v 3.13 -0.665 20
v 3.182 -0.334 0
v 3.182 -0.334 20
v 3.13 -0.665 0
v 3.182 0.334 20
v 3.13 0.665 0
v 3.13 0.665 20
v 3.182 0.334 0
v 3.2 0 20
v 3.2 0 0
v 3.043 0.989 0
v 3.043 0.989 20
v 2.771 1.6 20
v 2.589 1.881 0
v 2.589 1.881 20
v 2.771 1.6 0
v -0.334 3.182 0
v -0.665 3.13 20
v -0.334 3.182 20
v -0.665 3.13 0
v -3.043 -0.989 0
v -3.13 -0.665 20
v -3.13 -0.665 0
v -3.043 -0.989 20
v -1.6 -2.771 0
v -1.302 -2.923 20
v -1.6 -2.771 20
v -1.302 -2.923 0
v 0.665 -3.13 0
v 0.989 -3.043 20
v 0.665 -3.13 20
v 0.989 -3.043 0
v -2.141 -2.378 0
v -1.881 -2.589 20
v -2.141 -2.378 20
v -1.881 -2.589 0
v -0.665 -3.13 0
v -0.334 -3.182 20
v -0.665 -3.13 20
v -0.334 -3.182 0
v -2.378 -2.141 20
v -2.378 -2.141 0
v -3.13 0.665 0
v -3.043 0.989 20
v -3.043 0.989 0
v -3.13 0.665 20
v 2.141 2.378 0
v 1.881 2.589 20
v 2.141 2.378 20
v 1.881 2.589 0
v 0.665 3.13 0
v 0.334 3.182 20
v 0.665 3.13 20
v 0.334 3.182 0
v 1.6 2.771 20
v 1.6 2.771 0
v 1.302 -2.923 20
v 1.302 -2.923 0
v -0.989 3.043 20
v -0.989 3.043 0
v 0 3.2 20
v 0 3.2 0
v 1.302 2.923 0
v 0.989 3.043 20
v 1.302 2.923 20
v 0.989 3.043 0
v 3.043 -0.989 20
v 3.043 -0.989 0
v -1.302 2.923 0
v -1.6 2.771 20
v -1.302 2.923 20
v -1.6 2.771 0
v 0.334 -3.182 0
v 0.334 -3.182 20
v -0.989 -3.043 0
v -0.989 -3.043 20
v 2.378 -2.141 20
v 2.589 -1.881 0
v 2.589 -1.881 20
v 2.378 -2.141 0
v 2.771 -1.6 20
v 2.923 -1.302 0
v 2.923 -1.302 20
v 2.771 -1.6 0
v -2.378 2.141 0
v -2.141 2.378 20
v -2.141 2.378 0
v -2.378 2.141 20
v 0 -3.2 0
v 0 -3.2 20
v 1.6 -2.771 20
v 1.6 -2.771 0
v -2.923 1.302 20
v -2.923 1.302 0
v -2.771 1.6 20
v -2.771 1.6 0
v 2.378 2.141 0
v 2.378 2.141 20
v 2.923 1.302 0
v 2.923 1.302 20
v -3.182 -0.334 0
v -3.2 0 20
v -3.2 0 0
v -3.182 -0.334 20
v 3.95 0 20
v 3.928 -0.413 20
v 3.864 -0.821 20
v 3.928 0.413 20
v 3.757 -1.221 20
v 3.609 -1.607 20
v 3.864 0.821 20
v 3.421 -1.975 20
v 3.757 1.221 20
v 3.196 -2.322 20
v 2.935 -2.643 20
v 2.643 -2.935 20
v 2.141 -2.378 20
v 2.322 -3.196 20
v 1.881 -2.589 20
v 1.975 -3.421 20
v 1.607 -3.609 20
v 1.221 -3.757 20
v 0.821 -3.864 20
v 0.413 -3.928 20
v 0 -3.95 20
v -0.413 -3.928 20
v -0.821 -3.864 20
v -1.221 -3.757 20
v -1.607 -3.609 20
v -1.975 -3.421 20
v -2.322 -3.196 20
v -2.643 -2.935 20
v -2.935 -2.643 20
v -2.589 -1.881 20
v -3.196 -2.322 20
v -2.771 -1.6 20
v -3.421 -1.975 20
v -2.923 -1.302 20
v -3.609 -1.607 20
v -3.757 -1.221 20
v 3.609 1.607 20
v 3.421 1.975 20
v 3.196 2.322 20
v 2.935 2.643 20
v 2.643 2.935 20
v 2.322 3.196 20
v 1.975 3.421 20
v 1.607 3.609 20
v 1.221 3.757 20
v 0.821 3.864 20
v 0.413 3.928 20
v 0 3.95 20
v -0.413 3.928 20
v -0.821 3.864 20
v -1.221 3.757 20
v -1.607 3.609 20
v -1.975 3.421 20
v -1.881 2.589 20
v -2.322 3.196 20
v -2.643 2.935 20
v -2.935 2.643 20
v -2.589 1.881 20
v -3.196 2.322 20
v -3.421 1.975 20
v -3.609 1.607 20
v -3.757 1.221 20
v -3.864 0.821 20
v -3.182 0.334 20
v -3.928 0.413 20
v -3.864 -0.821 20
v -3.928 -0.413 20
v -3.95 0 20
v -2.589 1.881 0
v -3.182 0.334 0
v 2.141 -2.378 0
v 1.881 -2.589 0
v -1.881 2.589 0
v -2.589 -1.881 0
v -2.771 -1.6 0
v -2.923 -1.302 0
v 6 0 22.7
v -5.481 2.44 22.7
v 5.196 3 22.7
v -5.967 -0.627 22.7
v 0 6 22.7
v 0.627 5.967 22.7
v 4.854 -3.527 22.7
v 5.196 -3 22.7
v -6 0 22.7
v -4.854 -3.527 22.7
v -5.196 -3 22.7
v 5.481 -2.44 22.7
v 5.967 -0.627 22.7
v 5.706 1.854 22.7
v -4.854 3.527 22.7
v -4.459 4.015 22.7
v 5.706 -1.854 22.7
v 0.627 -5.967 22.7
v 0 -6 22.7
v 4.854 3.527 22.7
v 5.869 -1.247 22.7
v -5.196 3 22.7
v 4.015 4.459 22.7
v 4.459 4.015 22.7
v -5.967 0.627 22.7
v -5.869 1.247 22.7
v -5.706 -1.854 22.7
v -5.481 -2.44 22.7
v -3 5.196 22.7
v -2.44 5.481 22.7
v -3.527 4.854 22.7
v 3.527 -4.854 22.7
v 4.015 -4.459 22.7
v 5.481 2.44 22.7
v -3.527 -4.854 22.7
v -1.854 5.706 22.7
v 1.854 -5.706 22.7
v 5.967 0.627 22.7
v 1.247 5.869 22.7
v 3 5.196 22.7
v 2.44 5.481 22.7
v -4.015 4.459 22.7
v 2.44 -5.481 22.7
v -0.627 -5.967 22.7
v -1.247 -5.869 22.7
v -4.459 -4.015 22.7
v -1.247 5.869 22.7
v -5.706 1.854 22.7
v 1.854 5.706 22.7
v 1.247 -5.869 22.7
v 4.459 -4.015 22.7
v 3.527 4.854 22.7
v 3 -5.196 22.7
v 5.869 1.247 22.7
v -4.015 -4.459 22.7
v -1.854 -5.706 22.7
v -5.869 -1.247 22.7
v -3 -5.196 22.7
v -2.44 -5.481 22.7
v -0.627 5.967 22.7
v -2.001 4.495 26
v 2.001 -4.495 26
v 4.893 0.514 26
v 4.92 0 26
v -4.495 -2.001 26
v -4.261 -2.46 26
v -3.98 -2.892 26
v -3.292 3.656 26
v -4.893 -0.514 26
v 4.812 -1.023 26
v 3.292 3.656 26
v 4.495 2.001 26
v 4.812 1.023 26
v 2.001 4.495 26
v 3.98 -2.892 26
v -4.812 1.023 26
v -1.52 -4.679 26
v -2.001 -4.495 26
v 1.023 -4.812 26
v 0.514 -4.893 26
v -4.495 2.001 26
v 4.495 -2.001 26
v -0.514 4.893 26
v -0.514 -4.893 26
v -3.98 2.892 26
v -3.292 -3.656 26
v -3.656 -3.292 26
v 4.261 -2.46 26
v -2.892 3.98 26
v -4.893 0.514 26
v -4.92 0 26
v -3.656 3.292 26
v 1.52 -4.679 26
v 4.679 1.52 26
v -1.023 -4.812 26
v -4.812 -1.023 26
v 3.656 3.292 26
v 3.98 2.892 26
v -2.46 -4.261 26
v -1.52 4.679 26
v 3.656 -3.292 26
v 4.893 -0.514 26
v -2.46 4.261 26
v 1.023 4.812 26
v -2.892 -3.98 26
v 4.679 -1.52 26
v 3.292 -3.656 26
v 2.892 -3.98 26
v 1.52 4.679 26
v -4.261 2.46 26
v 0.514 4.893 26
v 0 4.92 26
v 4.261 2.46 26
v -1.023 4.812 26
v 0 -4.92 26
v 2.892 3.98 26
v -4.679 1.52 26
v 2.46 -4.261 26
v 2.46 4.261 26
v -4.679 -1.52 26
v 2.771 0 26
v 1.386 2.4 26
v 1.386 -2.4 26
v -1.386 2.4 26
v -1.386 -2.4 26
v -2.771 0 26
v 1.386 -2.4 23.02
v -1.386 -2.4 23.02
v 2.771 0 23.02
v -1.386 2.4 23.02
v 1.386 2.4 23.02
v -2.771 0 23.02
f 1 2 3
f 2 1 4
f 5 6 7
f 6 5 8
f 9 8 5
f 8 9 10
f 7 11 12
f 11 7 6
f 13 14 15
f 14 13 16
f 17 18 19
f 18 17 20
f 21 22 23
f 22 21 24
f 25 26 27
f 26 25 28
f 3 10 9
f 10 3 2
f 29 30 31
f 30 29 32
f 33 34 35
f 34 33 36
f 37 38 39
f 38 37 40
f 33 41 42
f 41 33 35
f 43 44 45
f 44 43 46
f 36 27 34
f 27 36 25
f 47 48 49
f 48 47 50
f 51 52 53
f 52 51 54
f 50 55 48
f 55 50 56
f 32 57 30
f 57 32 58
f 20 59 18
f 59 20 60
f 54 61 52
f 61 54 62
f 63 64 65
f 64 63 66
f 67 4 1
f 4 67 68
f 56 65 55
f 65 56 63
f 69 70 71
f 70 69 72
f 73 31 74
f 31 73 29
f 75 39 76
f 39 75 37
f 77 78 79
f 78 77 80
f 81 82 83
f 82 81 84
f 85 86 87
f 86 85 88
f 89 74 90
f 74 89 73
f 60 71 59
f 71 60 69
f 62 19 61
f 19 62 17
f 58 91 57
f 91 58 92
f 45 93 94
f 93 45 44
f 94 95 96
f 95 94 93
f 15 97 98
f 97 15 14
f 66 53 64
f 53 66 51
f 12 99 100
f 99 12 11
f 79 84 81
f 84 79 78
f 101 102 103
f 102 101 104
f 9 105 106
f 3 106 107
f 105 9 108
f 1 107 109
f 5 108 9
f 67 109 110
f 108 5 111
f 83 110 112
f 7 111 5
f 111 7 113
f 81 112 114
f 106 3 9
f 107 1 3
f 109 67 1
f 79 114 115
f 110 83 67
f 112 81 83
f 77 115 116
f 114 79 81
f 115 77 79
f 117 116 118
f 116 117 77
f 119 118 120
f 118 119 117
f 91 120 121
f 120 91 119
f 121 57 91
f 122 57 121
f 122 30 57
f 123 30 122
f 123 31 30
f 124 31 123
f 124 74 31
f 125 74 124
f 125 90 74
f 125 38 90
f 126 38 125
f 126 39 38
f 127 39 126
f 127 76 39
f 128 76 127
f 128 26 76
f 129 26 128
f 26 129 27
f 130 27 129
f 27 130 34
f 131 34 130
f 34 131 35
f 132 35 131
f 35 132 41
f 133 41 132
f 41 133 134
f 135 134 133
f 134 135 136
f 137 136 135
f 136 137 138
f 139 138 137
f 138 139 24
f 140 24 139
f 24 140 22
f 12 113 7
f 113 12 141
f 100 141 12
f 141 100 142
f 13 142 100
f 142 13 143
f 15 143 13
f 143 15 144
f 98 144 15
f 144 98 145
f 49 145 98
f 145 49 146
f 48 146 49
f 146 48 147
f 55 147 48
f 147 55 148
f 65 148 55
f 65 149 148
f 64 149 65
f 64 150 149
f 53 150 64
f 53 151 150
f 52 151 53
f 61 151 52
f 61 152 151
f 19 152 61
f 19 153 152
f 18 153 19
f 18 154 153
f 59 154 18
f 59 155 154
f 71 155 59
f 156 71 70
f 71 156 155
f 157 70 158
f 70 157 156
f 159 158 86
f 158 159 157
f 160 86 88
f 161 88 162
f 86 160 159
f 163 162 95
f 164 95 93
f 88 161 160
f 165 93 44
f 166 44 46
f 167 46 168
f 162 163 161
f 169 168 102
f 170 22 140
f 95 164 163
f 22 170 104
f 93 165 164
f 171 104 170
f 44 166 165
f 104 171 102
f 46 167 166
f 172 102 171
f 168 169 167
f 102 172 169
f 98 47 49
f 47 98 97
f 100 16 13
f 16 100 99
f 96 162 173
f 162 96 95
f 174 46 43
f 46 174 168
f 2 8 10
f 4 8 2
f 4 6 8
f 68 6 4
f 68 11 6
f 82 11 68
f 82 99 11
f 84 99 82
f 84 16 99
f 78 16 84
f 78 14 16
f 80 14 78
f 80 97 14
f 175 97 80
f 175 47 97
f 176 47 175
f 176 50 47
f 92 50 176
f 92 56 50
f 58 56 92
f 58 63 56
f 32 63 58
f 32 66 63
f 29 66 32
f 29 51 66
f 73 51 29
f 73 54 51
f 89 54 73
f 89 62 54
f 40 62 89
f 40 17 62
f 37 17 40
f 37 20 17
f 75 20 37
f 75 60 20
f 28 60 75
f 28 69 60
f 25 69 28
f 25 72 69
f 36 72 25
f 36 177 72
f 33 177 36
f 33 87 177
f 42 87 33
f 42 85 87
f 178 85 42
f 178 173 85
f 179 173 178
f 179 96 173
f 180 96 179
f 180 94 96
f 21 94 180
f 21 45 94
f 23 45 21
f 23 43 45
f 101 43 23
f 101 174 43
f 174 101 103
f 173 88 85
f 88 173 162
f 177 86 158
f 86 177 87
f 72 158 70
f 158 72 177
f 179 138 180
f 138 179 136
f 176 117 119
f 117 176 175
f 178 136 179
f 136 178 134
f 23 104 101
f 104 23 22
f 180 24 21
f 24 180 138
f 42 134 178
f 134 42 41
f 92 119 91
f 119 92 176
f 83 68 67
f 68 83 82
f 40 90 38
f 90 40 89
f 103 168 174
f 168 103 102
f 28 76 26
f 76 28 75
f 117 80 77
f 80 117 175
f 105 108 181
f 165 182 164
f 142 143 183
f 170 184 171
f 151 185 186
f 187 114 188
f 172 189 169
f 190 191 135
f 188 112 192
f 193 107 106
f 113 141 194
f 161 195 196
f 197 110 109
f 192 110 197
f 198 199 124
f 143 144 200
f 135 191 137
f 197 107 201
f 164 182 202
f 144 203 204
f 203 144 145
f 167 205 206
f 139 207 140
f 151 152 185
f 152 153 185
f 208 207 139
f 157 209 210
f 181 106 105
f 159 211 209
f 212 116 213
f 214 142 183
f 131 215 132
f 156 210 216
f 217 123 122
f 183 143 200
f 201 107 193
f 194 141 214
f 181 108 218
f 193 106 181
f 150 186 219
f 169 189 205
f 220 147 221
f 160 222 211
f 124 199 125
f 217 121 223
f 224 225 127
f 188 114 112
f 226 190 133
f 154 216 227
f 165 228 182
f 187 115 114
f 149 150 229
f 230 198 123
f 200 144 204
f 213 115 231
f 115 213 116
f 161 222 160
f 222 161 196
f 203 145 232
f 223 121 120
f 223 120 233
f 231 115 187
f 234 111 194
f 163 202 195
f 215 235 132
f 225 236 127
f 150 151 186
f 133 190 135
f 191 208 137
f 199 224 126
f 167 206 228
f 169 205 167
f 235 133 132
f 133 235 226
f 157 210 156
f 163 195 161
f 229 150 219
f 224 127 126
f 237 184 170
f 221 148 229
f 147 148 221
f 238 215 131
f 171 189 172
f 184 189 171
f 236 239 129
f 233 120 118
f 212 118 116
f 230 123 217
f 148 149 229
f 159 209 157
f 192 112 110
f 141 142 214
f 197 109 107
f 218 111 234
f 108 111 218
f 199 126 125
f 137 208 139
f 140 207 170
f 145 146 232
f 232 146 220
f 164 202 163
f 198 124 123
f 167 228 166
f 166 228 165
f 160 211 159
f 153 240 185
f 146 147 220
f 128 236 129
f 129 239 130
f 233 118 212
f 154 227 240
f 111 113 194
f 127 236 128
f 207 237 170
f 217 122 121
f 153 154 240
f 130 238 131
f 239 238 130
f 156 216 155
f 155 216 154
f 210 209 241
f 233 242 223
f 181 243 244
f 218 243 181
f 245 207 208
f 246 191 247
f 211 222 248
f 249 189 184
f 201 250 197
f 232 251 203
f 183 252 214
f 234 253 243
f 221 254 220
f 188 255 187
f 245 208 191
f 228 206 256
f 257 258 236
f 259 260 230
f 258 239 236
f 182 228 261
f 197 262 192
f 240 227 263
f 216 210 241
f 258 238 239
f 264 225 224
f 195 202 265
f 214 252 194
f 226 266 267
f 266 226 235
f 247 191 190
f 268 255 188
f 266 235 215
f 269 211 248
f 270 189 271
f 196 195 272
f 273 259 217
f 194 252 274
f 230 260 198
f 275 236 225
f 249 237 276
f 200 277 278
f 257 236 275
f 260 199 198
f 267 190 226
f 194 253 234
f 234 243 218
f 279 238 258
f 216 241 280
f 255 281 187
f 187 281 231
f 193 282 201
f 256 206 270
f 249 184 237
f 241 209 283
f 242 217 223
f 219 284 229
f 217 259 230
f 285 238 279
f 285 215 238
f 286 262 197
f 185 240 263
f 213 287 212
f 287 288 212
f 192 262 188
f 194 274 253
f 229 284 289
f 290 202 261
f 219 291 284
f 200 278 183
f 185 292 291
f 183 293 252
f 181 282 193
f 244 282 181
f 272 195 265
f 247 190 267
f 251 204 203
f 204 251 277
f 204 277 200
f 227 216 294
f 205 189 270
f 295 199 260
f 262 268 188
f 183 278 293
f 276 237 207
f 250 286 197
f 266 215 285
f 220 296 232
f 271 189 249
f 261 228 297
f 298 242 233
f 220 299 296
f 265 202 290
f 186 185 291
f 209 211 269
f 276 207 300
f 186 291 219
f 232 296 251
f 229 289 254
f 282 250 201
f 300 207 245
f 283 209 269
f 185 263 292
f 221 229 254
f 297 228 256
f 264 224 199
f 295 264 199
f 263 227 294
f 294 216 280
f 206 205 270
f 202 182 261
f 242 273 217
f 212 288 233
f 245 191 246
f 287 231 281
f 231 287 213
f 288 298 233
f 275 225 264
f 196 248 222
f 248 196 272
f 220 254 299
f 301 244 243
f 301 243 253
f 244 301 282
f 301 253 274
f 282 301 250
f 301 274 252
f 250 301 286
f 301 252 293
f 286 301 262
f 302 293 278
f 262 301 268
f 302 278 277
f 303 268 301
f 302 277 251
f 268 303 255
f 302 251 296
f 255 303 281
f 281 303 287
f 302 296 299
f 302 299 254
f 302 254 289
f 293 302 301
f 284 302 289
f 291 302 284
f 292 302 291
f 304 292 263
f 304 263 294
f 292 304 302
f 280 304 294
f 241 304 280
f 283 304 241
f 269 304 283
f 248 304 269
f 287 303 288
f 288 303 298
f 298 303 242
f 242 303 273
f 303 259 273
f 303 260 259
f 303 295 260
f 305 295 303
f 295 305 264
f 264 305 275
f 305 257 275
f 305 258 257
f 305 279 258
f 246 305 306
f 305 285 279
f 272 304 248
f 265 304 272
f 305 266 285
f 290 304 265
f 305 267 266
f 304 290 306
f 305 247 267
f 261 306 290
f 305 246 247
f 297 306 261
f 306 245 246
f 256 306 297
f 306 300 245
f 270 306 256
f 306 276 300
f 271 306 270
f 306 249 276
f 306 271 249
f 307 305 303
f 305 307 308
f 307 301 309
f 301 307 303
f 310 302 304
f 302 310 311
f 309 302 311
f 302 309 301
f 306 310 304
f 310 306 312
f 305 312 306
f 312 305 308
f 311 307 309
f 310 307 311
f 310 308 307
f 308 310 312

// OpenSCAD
// Low-profile button-head screw.
$fn = 60;
eps = 0.02;
shaft_d = 6.4;
head_d = 12;
head_h = 6;
shaft_l = 20;
socket_flat = head_d * 0.40;
difference() {
    union() {
        cylinder(d = shaft_d, h = shaft_l);
        translate([0, 0, shaft_l]) cylinder(d1 = shaft_d + 1.5, d2 = head_d, h = head_h * 0.45);
        translate([0, 0, shaft_l + head_h * 0.45]) cylinder(d1 = head_d, d2 = head_d * 0.82, h = head_h * 0.55);
    }
    translate([0, 0, shaft_l + head_h - head_h * 0.5 + eps])
        cylinder(d = socket_flat / cos(30), h = head_h * 0.5 + eps, $fn = 6);
}
